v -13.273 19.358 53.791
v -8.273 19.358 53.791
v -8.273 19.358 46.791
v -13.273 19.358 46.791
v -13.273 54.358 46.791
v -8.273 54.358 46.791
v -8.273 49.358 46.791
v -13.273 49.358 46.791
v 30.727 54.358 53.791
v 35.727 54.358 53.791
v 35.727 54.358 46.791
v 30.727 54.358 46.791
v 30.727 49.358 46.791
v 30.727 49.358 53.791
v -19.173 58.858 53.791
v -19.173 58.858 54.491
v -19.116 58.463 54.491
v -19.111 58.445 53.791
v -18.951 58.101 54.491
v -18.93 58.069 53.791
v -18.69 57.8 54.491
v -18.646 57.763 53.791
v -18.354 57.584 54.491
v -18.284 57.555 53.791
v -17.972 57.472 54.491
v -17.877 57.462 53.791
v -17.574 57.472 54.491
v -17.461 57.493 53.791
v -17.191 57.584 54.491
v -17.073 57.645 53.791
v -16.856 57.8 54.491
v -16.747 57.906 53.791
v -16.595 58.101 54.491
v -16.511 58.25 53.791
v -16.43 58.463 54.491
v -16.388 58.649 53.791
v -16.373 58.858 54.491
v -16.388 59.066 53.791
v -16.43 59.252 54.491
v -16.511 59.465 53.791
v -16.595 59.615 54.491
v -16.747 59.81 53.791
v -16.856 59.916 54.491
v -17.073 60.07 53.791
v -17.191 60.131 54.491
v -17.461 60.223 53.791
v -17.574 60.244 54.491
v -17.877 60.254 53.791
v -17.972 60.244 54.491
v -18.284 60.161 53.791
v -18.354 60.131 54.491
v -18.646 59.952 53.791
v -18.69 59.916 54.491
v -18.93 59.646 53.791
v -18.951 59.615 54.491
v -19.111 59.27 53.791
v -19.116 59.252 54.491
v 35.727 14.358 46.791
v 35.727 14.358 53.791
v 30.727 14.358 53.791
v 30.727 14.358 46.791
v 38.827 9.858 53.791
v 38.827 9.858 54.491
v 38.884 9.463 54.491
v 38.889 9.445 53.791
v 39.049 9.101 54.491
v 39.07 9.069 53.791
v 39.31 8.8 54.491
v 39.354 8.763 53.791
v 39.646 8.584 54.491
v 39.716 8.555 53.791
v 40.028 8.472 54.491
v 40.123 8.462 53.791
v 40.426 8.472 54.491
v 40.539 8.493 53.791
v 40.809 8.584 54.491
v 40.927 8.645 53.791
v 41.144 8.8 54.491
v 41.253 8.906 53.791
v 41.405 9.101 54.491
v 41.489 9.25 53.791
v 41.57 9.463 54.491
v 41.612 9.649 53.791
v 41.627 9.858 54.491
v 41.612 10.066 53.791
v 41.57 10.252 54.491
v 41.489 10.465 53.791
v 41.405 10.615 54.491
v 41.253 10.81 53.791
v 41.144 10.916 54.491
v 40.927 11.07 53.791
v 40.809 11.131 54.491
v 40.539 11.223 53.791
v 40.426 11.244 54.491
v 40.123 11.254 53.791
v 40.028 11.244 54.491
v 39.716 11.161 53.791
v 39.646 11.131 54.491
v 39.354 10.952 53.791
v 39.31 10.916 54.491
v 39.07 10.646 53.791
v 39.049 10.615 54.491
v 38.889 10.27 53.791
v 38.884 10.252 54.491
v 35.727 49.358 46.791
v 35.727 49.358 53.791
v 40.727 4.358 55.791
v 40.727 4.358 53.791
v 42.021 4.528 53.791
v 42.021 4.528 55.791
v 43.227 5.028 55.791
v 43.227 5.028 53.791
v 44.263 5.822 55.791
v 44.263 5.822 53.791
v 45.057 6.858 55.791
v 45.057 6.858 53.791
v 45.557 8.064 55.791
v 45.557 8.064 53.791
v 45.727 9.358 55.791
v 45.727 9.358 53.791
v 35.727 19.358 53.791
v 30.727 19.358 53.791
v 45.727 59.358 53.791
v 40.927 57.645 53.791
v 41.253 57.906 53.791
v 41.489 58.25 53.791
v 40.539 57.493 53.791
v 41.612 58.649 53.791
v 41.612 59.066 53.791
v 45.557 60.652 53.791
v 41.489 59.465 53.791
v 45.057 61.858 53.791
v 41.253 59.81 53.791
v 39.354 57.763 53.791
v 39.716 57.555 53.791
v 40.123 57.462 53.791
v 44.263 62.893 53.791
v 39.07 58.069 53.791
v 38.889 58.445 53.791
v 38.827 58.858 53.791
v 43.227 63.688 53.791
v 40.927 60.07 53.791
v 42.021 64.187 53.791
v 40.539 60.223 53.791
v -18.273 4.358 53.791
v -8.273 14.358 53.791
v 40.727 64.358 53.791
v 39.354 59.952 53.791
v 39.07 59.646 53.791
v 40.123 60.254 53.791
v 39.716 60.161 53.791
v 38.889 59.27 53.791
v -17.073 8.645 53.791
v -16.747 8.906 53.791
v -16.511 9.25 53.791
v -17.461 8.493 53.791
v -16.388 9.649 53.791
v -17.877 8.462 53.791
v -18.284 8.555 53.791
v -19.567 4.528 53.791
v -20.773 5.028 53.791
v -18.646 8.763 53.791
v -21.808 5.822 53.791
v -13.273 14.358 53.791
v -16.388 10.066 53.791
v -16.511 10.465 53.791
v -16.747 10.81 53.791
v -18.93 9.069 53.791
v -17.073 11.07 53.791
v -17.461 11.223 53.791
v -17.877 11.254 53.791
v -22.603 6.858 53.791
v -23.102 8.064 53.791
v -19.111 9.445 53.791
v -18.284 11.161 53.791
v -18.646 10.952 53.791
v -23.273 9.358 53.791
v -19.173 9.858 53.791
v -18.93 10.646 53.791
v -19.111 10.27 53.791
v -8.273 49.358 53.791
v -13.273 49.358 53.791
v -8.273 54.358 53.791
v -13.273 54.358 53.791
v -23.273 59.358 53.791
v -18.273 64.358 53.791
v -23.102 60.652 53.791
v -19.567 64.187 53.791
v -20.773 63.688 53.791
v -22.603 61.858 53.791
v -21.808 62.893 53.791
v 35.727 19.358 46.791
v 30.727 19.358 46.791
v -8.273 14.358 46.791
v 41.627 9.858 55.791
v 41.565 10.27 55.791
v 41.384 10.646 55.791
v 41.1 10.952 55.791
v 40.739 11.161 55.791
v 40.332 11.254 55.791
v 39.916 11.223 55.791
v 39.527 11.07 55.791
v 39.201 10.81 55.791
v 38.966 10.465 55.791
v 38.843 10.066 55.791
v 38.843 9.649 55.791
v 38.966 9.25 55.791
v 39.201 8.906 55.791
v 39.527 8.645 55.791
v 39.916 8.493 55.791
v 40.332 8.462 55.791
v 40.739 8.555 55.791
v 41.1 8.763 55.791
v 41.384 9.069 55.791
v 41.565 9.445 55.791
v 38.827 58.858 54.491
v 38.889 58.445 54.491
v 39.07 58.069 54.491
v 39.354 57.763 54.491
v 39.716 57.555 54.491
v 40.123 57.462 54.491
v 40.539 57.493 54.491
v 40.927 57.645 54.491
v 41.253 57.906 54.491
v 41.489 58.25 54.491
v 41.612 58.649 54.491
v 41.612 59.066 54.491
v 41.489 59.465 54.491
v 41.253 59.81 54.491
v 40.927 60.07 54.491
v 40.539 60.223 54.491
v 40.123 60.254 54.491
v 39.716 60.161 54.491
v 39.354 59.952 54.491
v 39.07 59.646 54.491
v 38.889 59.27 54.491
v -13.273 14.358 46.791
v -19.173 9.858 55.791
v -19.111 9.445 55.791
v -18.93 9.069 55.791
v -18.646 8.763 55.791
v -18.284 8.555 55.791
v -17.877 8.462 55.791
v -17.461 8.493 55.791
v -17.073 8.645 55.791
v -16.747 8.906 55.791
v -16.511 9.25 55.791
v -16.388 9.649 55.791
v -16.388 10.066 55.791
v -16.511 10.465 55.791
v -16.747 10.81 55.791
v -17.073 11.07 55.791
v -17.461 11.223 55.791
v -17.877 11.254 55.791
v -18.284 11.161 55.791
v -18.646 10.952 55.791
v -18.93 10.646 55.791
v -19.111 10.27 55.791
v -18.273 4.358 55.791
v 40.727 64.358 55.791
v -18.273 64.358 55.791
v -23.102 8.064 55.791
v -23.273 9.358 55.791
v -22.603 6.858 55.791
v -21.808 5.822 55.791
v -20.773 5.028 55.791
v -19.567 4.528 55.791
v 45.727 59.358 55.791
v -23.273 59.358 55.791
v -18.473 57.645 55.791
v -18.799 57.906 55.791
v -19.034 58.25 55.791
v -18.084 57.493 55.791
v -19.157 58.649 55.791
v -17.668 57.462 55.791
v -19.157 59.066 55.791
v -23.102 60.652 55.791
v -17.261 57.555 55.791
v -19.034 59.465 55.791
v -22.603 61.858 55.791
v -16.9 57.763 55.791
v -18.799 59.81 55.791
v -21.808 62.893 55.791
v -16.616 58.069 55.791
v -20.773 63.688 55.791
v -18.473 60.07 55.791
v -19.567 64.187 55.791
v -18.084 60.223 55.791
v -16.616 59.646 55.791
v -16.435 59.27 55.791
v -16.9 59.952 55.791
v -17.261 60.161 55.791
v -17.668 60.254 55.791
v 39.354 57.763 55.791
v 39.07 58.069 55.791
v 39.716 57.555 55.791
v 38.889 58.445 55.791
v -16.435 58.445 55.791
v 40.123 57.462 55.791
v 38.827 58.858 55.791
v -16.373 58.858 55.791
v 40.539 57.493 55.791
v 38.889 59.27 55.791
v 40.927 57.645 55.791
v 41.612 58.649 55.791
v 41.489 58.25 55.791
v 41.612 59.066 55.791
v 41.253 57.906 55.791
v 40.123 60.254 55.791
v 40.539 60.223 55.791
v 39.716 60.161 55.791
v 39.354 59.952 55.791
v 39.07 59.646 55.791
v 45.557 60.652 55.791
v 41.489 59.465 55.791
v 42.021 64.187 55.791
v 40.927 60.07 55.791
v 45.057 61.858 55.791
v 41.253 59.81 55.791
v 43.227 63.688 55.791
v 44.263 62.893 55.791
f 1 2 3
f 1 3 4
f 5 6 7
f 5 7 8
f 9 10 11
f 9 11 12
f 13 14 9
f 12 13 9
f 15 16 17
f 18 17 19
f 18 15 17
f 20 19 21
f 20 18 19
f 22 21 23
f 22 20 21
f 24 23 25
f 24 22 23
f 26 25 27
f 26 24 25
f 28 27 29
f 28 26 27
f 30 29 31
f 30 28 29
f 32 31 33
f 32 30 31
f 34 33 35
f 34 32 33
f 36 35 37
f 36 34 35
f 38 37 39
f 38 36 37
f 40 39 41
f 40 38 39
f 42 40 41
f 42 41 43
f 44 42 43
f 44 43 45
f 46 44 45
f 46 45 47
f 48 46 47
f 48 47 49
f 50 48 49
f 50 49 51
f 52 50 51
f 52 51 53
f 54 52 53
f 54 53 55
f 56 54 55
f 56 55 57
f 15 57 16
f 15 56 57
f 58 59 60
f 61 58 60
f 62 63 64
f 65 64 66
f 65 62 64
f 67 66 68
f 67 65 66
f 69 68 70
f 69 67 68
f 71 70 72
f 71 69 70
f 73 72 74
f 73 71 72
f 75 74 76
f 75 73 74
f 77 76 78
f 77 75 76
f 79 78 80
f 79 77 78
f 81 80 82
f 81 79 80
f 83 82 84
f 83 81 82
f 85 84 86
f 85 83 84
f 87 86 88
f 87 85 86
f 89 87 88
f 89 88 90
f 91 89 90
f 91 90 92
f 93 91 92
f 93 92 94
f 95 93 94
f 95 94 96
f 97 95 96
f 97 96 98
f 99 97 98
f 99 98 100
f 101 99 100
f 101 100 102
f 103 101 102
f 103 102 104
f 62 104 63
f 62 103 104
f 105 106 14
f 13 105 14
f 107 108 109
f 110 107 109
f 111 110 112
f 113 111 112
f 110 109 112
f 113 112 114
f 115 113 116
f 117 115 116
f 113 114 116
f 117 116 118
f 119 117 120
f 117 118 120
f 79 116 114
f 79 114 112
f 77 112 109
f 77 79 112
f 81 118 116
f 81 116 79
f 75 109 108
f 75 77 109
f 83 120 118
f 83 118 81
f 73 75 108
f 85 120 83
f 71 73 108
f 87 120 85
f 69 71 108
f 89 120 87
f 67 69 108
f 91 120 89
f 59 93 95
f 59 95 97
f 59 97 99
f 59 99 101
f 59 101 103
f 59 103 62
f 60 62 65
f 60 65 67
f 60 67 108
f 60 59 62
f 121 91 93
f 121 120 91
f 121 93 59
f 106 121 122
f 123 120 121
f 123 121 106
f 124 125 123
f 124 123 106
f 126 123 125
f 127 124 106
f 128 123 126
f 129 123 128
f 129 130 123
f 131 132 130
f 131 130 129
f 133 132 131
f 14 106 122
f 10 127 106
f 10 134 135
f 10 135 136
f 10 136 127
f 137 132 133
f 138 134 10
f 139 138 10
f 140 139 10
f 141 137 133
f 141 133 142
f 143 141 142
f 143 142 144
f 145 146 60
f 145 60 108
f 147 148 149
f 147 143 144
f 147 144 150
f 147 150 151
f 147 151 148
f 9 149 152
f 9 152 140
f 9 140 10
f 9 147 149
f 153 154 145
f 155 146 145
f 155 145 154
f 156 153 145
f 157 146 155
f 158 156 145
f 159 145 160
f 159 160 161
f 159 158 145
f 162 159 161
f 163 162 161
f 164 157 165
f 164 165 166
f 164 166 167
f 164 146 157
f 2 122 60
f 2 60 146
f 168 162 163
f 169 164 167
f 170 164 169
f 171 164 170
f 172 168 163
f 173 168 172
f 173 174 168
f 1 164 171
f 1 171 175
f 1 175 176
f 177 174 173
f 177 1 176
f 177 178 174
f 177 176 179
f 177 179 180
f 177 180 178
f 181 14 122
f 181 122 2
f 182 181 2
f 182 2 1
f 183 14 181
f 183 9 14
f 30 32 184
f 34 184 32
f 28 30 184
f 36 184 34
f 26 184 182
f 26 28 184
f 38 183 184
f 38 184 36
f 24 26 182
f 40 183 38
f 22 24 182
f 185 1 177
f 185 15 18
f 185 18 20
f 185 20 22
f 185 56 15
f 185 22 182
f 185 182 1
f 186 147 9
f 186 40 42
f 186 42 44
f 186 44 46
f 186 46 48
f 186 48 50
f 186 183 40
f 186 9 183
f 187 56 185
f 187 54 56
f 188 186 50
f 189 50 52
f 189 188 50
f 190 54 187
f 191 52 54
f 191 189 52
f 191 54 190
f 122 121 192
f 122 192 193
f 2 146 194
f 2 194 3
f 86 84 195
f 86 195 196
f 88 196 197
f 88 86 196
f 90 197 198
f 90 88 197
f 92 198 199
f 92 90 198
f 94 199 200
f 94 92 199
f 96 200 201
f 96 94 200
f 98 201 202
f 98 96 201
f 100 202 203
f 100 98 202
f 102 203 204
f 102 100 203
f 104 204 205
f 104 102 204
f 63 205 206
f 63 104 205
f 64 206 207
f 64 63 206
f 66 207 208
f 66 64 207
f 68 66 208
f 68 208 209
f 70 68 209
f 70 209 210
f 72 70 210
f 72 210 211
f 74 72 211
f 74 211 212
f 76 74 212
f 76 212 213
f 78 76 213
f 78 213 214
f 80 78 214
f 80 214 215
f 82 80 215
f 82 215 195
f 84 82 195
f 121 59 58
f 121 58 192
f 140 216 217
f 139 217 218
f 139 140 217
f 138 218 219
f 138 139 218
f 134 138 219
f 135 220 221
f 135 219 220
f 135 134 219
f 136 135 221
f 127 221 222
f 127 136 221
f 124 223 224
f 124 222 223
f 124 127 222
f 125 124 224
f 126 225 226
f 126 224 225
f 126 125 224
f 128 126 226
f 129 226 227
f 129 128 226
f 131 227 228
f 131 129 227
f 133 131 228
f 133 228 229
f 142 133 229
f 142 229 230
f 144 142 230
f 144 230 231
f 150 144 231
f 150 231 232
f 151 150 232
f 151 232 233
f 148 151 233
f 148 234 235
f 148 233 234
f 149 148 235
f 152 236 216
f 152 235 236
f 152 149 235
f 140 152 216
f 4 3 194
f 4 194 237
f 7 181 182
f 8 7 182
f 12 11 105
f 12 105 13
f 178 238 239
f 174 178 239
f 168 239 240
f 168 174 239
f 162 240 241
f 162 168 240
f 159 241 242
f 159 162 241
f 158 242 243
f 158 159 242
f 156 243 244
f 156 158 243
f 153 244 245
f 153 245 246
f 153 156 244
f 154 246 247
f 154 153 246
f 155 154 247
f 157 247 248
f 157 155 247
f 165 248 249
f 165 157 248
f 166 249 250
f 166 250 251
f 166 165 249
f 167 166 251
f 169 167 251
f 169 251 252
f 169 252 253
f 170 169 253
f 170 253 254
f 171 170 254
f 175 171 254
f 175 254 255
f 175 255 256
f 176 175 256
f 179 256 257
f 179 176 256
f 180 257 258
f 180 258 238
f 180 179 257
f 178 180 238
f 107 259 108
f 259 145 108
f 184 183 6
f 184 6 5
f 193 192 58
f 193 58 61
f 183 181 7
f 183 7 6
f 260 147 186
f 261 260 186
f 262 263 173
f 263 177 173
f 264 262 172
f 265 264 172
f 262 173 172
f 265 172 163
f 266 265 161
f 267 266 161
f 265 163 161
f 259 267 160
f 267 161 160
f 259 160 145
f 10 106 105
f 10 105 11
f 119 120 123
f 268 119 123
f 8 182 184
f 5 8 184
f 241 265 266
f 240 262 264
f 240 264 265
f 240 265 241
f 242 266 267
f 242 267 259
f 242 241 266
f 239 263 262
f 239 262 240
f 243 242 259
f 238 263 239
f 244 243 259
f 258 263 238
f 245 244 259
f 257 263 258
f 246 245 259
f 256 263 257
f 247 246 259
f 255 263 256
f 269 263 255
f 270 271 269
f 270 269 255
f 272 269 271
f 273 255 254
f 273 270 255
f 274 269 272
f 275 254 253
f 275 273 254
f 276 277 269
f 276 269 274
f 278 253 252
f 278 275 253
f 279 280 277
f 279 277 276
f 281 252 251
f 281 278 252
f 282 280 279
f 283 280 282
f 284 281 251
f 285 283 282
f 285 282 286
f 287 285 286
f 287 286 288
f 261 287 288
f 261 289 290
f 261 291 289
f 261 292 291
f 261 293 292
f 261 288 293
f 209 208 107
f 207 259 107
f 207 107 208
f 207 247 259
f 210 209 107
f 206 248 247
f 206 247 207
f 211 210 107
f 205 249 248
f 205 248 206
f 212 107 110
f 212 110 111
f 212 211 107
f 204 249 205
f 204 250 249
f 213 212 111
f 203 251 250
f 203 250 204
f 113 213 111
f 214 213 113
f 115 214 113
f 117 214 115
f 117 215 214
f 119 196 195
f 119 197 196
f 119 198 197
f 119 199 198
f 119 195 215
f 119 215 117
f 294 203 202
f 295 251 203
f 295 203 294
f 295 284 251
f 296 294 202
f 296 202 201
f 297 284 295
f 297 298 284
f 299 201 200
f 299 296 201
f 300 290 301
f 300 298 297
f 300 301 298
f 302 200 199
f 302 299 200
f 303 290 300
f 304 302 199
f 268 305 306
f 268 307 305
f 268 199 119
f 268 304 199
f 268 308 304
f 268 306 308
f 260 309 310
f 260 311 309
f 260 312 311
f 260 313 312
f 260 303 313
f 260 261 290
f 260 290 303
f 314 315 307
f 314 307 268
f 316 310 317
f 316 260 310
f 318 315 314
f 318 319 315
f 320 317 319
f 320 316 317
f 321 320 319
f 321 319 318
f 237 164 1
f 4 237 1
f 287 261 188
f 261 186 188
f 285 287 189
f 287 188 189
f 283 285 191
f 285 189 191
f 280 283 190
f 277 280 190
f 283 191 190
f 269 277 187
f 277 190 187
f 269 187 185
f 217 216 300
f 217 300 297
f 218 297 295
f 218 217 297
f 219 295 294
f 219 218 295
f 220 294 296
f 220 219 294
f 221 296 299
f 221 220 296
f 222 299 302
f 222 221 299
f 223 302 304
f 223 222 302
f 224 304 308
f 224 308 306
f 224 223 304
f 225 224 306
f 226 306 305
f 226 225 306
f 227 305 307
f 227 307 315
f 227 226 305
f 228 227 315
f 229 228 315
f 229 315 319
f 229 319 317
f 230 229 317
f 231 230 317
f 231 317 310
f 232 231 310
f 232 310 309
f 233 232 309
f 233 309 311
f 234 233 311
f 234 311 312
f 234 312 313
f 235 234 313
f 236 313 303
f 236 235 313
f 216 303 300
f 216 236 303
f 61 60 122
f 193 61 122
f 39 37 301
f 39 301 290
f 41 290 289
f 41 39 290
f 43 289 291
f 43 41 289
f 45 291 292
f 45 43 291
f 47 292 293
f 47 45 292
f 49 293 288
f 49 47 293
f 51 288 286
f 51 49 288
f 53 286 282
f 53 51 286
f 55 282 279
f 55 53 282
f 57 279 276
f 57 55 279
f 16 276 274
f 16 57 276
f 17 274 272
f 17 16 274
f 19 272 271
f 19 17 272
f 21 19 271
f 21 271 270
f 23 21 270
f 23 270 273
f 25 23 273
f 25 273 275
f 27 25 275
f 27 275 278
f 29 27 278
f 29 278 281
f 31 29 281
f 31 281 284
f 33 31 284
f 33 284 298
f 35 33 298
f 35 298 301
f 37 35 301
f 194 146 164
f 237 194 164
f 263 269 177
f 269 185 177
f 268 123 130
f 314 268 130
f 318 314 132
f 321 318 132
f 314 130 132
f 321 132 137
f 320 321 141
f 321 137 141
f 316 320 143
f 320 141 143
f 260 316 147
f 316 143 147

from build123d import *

# Parameters (mm, degrees)
BOSS_EXTRUDE1_DEPTH      = 6.5
SKETCH5_R                = 3
SKETCH5_R_2              = 1.4
BOSS_EXTRUDE5_DEPTH      = 3.2
BOSS_EXTRUDE5_2_DEPTH    = 3.2
BOSS_EXTRUDE5_3_DEPTH    = 3.2
BOSS_EXTRUDE5_4_DEPTH    = 3.2
BOSS_EXTRUDE6_START      = -1.5
BOSS_EXTRUDE6_DEPTH      = 1.5
CUT_EXTRUDE9_START       = -1.5
SKETCH17_R               = 1.4
CUT_EXTRUDE9_DEPTH       = 1.5
CUT_EXTRUDE10_DEPTH      = 10
CUT_EXTRUDE10_DEPTH_BACK = 4
SKETCH18_W               = 118.483225972
SKETCH18_H               = 113.092379331
SKETCH19_W               = 5
SKETCH19_H               = 5
BOSS_EXTRUDE9_DEPTH      = 7
SKETCH20_R               = 1.4
BOSS_EXTRUDE10_DEPTH     = 1.3


with BuildPart() as part:
    # Sketch3 → Boss-Extrude1 (new body)
    with BuildSketch(Plane.XY.offset(55.290865561)):
        with BuildLine():
            Line((-23.272824317, 59.357808031), (-23.272824317, 9.357808031))
            ThreePointArc((-23.272824317, 9.357808031), (-21.808358223, 5.822274126), (-18.272824317, 4.357808031))
            Line((-18.272824317, 4.357808031), (40.727175683, 4.357808031))
            ThreePointArc((40.727175683, 4.357808031), (44.262709589, 5.822274126), (45.727175683, 9.357808031))
            Line((45.727175683, 9.357808031), (45.727175683, 59.357808031))
            ThreePointArc((45.727175683, 59.357808031), (44.262709589, 62.893341937), (40.727175683, 64.357808031))
            Line((40.727175683, 64.357808031), (-18.272824317, 64.357808031))
            ThreePointArc((-18.272824317, 64.357808031), (-21.808358223, 62.893341937), (-23.272824317, 59.357808031))
        make_face()
        with BuildLine():
            Line((40.727175683, 62.857808031), (-18.272824317, 62.857808031))
            ThreePointArc((-18.272824317, 62.857808031), (-20.747698051, 61.832681766), (-21.772824317, 59.357808031))
            Line((-21.772824317, 59.357808031), (-21.772824317, 9.357808031))
            ThreePointArc((-21.772824317, 9.357808031), (-20.747698051, 6.882934297), (-18.272824317, 5.857808031))
            Line((-18.272824317, 5.857808031), (40.727175683, 5.857808031))
            ThreePointArc((40.727175683, 5.857808031), (43.202049418, 6.882934297), (44.227175683, 9.357808031))
            Line((44.227175683, 9.357808031), (44.227175683, 59.357808031))
            ThreePointArc((44.227175683, 59.357808031), (43.202049418, 61.832681766), (40.727175683, 62.857808031))
        make_face(mode=Mode.SUBTRACT)
    extrude(amount=BOSS_EXTRUDE1_DEPTH)



with BuildPart() as body_2:
    # Sketch5 → Boss-Extrude5 (new body)
    with BuildSketch(Plane.XY.offset(55.290865561)):
        with Locations((-17.772824317, 58.857808031)):
            Circle(SKETCH5_R)
        with Locations(Location((-17.772824317, 58.857808031, 0), (0, 0, 180))):
            Circle(SKETCH5_R_2, mode=Mode.SUBTRACT)
    extrude(amount=BOSS_EXTRUDE5_DEPTH)


with BuildPart() as body_3:
    # Sketch5 → Boss-Extrude5 2 (new body)
    with BuildSketch(Plane.XY.offset(55.290865561)):
        with Locations(Location((40.227175683, 58.857808031, 0), (0, 0, 180))):
            Circle(SKETCH5_R)
        with Locations((40.227175683, 58.857808031)):
            Circle(SKETCH5_R_2, mode=Mode.SUBTRACT)
    extrude(amount=BOSS_EXTRUDE5_2_DEPTH)


with BuildPart() as body_4:
    # Sketch5 → Boss-Extrude5 3 (new body)
    with BuildSketch(Plane.XY.offset(55.290865561)):
        with Locations(Location((-17.772824317, 9.857808031, 0), (0, 0, 180))):
            Circle(SKETCH5_R)
        with Locations((-17.772824317, 9.857808031)):
            Circle(SKETCH5_R_2, mode=Mode.SUBTRACT)
    extrude(amount=BOSS_EXTRUDE5_3_DEPTH)


with BuildPart() as body_5:
    # Sketch5 → Boss-Extrude5 4 (new body)
    with BuildSketch(Plane.XY.offset(55.290865561)):
        with Locations((40.227175683, 9.857808031)):
            Circle(SKETCH5_R)
        with Locations(Location((40.227175683, 9.857808031, 0), (0, 0, 180))):
            Circle(SKETCH5_R_2, mode=Mode.SUBTRACT)
    extrude(amount=BOSS_EXTRUDE5_4_DEPTH)


with BuildPart() as part_1:
    add(part.part)

    add(body_2.part)  # Boss-Extrude6 merges body 2

    add(body_3.part)  # Boss-Extrude6 merges body 3

    add(body_4.part)  # Boss-Extrude6 merges body 4

    add(body_5.part)  # Boss-Extrude6 merges body 5
    # Sketch13 → Boss-Extrude6 (add)
    with BuildSketch(Plane.XY.offset(55.290865561).offset(BOSS_EXTRUDE6_START)):
        with BuildLine():
            Line((-23.272824317, 26.657808031), (-23.272824317, 42.657808031))
            Line((-23.272824317, 42.657808031), (-23.272824317, 59.357808031))
            ThreePointArc((-23.272824317, 59.357808031), (-21.808358223, 62.893341937), (-18.272824317, 64.357808031))
            Line((-18.272824317, 64.357808031), (40.727175683, 64.357808031))
            ThreePointArc((40.727175683, 64.357808031), (44.262709589, 62.893341937), (45.727175683, 59.357808031))
            Line((45.727175683, 59.357808031), (45.727175683, 9.357808031))
            ThreePointArc((45.727175683, 9.357808031), (44.262709589, 5.822274126), (40.727175683, 4.357808031))
            Line((40.727175683, 4.357808031), (-18.272824317, 4.357808031))
            ThreePointArc((-18.272824317, 4.357808031), (-21.808358223, 5.822274126), (-23.272824317, 9.357808031))
            Line((-23.272824317, 9.357808031), (-23.272824317, 26.657808031))
        make_face()
    extrude(amount=BOSS_EXTRUDE6_DEPTH)

    # Sketch17 → Cut-Extrude9 (cut)
    with BuildSketch(Plane.XY.offset(55.290865561).offset(CUT_EXTRUDE9_START)):
        with Locations(Location((40.227175683, 9.857808031, 0), (0, 0, 180))):
            Circle(SKETCH17_R)
        with Locations(Location((-17.772824317, 9.857808031, 0), (0, 0, 180))):
            Circle(SKETCH17_R)
        with Locations(Location((-17.772824317, 58.857808031, 0), (0, 0, 180))):
            Circle(SKETCH17_R)
        with Locations(Location((40.227175683, 58.857808031, 0), (0, 0, 180))):
            Circle(SKETCH17_R)
    extrude(amount=CUT_EXTRUDE9_DEPTH, mode=Mode.SUBTRACT)

    # Sketch18 → Cut-Extrude10 (cut, two sides: drawn at the far end of the back side and taken through both)
    with BuildSketch(Plane.XY.offset(58.490865561).offset(-CUT_EXTRUDE10_DEPTH_BACK)):
        with Locations((8.738192824, 45.025275568)):
            Rectangle(SKETCH18_W, SKETCH18_H)
    extrude(amount=CUT_EXTRUDE10_DEPTH + CUT_EXTRUDE10_DEPTH_BACK, mode=Mode.SUBTRACT)

    # Sketch19 → Boss-Extrude9 (add)
    with BuildSketch(Plane(origin=(0, 0, 53.790865561), x_dir=(-1, 0, 0), z_dir=(0, 0, -1))):
        with Locations((-33.227175683, 51.857808031)):
            Rectangle(SKETCH19_W, SKETCH19_H)
        with Locations((10.772824317, 16.857808031)):
            Rectangle(SKETCH19_W, SKETCH19_H)
        with Locations((10.772824317, 51.857808031)):
            Rectangle(SKETCH19_W, SKETCH19_H)
        with Locations((-33.227175683, 16.857808031)):
            Rectangle(SKETCH19_W, SKETCH19_H)
    extrude(amount=BOSS_EXTRUDE9_DEPTH)

    # Sketch20 → Boss-Extrude10 (add)
    with BuildSketch(Plane.XY.offset(54.490865561)):
        with BuildLine():
            Line((40.727175683, 64.357808031), (-18.272824317, 64.357808031))
            ThreePointArc((-18.272824317, 64.357808031), (-21.808358223, 62.893341937), (-23.272824317, 59.357808031))
            Line((-23.272824317, 59.357808031), (-23.272824317, 9.357808031))
            ThreePointArc((-23.272824317, 9.357808031), (-21.808358223, 5.822274126), (-18.272824317, 4.357808031))
            Line((-18.272824317, 4.357808031), (40.727175683, 4.357808031))
            ThreePointArc((40.727175683, 4.357808031), (44.262709589, 5.822274126), (45.727175683, 9.357808031))
            Line((45.727175683, 9.357808031), (45.727175683, 59.357808031))
            ThreePointArc((45.727175683, 59.357808031), (44.262709589, 62.893341937), (40.727175683, 64.357808031))
        make_face()
        with Locations(Location((-17.772824317, 9.857808031, 0), (0, 0, 180))):
            Circle(SKETCH20_R, mode=Mode.SUBTRACT)
        with Locations((-17.772824317, 58.857808031)):
            Circle(SKETCH20_R, mode=Mode.SUBTRACT)
        with Locations(Location((40.227175683, 58.857808031, 0), (0, 0, 180))):
            Circle(SKETCH20_R, mode=Mode.SUBTRACT)
        with Locations((40.227175683, 9.857808031)):
            Circle(SKETCH20_R, mode=Mode.SUBTRACT)
    extrude(amount=BOSS_EXTRUDE10_DEPTH)


solid = part_1.part
